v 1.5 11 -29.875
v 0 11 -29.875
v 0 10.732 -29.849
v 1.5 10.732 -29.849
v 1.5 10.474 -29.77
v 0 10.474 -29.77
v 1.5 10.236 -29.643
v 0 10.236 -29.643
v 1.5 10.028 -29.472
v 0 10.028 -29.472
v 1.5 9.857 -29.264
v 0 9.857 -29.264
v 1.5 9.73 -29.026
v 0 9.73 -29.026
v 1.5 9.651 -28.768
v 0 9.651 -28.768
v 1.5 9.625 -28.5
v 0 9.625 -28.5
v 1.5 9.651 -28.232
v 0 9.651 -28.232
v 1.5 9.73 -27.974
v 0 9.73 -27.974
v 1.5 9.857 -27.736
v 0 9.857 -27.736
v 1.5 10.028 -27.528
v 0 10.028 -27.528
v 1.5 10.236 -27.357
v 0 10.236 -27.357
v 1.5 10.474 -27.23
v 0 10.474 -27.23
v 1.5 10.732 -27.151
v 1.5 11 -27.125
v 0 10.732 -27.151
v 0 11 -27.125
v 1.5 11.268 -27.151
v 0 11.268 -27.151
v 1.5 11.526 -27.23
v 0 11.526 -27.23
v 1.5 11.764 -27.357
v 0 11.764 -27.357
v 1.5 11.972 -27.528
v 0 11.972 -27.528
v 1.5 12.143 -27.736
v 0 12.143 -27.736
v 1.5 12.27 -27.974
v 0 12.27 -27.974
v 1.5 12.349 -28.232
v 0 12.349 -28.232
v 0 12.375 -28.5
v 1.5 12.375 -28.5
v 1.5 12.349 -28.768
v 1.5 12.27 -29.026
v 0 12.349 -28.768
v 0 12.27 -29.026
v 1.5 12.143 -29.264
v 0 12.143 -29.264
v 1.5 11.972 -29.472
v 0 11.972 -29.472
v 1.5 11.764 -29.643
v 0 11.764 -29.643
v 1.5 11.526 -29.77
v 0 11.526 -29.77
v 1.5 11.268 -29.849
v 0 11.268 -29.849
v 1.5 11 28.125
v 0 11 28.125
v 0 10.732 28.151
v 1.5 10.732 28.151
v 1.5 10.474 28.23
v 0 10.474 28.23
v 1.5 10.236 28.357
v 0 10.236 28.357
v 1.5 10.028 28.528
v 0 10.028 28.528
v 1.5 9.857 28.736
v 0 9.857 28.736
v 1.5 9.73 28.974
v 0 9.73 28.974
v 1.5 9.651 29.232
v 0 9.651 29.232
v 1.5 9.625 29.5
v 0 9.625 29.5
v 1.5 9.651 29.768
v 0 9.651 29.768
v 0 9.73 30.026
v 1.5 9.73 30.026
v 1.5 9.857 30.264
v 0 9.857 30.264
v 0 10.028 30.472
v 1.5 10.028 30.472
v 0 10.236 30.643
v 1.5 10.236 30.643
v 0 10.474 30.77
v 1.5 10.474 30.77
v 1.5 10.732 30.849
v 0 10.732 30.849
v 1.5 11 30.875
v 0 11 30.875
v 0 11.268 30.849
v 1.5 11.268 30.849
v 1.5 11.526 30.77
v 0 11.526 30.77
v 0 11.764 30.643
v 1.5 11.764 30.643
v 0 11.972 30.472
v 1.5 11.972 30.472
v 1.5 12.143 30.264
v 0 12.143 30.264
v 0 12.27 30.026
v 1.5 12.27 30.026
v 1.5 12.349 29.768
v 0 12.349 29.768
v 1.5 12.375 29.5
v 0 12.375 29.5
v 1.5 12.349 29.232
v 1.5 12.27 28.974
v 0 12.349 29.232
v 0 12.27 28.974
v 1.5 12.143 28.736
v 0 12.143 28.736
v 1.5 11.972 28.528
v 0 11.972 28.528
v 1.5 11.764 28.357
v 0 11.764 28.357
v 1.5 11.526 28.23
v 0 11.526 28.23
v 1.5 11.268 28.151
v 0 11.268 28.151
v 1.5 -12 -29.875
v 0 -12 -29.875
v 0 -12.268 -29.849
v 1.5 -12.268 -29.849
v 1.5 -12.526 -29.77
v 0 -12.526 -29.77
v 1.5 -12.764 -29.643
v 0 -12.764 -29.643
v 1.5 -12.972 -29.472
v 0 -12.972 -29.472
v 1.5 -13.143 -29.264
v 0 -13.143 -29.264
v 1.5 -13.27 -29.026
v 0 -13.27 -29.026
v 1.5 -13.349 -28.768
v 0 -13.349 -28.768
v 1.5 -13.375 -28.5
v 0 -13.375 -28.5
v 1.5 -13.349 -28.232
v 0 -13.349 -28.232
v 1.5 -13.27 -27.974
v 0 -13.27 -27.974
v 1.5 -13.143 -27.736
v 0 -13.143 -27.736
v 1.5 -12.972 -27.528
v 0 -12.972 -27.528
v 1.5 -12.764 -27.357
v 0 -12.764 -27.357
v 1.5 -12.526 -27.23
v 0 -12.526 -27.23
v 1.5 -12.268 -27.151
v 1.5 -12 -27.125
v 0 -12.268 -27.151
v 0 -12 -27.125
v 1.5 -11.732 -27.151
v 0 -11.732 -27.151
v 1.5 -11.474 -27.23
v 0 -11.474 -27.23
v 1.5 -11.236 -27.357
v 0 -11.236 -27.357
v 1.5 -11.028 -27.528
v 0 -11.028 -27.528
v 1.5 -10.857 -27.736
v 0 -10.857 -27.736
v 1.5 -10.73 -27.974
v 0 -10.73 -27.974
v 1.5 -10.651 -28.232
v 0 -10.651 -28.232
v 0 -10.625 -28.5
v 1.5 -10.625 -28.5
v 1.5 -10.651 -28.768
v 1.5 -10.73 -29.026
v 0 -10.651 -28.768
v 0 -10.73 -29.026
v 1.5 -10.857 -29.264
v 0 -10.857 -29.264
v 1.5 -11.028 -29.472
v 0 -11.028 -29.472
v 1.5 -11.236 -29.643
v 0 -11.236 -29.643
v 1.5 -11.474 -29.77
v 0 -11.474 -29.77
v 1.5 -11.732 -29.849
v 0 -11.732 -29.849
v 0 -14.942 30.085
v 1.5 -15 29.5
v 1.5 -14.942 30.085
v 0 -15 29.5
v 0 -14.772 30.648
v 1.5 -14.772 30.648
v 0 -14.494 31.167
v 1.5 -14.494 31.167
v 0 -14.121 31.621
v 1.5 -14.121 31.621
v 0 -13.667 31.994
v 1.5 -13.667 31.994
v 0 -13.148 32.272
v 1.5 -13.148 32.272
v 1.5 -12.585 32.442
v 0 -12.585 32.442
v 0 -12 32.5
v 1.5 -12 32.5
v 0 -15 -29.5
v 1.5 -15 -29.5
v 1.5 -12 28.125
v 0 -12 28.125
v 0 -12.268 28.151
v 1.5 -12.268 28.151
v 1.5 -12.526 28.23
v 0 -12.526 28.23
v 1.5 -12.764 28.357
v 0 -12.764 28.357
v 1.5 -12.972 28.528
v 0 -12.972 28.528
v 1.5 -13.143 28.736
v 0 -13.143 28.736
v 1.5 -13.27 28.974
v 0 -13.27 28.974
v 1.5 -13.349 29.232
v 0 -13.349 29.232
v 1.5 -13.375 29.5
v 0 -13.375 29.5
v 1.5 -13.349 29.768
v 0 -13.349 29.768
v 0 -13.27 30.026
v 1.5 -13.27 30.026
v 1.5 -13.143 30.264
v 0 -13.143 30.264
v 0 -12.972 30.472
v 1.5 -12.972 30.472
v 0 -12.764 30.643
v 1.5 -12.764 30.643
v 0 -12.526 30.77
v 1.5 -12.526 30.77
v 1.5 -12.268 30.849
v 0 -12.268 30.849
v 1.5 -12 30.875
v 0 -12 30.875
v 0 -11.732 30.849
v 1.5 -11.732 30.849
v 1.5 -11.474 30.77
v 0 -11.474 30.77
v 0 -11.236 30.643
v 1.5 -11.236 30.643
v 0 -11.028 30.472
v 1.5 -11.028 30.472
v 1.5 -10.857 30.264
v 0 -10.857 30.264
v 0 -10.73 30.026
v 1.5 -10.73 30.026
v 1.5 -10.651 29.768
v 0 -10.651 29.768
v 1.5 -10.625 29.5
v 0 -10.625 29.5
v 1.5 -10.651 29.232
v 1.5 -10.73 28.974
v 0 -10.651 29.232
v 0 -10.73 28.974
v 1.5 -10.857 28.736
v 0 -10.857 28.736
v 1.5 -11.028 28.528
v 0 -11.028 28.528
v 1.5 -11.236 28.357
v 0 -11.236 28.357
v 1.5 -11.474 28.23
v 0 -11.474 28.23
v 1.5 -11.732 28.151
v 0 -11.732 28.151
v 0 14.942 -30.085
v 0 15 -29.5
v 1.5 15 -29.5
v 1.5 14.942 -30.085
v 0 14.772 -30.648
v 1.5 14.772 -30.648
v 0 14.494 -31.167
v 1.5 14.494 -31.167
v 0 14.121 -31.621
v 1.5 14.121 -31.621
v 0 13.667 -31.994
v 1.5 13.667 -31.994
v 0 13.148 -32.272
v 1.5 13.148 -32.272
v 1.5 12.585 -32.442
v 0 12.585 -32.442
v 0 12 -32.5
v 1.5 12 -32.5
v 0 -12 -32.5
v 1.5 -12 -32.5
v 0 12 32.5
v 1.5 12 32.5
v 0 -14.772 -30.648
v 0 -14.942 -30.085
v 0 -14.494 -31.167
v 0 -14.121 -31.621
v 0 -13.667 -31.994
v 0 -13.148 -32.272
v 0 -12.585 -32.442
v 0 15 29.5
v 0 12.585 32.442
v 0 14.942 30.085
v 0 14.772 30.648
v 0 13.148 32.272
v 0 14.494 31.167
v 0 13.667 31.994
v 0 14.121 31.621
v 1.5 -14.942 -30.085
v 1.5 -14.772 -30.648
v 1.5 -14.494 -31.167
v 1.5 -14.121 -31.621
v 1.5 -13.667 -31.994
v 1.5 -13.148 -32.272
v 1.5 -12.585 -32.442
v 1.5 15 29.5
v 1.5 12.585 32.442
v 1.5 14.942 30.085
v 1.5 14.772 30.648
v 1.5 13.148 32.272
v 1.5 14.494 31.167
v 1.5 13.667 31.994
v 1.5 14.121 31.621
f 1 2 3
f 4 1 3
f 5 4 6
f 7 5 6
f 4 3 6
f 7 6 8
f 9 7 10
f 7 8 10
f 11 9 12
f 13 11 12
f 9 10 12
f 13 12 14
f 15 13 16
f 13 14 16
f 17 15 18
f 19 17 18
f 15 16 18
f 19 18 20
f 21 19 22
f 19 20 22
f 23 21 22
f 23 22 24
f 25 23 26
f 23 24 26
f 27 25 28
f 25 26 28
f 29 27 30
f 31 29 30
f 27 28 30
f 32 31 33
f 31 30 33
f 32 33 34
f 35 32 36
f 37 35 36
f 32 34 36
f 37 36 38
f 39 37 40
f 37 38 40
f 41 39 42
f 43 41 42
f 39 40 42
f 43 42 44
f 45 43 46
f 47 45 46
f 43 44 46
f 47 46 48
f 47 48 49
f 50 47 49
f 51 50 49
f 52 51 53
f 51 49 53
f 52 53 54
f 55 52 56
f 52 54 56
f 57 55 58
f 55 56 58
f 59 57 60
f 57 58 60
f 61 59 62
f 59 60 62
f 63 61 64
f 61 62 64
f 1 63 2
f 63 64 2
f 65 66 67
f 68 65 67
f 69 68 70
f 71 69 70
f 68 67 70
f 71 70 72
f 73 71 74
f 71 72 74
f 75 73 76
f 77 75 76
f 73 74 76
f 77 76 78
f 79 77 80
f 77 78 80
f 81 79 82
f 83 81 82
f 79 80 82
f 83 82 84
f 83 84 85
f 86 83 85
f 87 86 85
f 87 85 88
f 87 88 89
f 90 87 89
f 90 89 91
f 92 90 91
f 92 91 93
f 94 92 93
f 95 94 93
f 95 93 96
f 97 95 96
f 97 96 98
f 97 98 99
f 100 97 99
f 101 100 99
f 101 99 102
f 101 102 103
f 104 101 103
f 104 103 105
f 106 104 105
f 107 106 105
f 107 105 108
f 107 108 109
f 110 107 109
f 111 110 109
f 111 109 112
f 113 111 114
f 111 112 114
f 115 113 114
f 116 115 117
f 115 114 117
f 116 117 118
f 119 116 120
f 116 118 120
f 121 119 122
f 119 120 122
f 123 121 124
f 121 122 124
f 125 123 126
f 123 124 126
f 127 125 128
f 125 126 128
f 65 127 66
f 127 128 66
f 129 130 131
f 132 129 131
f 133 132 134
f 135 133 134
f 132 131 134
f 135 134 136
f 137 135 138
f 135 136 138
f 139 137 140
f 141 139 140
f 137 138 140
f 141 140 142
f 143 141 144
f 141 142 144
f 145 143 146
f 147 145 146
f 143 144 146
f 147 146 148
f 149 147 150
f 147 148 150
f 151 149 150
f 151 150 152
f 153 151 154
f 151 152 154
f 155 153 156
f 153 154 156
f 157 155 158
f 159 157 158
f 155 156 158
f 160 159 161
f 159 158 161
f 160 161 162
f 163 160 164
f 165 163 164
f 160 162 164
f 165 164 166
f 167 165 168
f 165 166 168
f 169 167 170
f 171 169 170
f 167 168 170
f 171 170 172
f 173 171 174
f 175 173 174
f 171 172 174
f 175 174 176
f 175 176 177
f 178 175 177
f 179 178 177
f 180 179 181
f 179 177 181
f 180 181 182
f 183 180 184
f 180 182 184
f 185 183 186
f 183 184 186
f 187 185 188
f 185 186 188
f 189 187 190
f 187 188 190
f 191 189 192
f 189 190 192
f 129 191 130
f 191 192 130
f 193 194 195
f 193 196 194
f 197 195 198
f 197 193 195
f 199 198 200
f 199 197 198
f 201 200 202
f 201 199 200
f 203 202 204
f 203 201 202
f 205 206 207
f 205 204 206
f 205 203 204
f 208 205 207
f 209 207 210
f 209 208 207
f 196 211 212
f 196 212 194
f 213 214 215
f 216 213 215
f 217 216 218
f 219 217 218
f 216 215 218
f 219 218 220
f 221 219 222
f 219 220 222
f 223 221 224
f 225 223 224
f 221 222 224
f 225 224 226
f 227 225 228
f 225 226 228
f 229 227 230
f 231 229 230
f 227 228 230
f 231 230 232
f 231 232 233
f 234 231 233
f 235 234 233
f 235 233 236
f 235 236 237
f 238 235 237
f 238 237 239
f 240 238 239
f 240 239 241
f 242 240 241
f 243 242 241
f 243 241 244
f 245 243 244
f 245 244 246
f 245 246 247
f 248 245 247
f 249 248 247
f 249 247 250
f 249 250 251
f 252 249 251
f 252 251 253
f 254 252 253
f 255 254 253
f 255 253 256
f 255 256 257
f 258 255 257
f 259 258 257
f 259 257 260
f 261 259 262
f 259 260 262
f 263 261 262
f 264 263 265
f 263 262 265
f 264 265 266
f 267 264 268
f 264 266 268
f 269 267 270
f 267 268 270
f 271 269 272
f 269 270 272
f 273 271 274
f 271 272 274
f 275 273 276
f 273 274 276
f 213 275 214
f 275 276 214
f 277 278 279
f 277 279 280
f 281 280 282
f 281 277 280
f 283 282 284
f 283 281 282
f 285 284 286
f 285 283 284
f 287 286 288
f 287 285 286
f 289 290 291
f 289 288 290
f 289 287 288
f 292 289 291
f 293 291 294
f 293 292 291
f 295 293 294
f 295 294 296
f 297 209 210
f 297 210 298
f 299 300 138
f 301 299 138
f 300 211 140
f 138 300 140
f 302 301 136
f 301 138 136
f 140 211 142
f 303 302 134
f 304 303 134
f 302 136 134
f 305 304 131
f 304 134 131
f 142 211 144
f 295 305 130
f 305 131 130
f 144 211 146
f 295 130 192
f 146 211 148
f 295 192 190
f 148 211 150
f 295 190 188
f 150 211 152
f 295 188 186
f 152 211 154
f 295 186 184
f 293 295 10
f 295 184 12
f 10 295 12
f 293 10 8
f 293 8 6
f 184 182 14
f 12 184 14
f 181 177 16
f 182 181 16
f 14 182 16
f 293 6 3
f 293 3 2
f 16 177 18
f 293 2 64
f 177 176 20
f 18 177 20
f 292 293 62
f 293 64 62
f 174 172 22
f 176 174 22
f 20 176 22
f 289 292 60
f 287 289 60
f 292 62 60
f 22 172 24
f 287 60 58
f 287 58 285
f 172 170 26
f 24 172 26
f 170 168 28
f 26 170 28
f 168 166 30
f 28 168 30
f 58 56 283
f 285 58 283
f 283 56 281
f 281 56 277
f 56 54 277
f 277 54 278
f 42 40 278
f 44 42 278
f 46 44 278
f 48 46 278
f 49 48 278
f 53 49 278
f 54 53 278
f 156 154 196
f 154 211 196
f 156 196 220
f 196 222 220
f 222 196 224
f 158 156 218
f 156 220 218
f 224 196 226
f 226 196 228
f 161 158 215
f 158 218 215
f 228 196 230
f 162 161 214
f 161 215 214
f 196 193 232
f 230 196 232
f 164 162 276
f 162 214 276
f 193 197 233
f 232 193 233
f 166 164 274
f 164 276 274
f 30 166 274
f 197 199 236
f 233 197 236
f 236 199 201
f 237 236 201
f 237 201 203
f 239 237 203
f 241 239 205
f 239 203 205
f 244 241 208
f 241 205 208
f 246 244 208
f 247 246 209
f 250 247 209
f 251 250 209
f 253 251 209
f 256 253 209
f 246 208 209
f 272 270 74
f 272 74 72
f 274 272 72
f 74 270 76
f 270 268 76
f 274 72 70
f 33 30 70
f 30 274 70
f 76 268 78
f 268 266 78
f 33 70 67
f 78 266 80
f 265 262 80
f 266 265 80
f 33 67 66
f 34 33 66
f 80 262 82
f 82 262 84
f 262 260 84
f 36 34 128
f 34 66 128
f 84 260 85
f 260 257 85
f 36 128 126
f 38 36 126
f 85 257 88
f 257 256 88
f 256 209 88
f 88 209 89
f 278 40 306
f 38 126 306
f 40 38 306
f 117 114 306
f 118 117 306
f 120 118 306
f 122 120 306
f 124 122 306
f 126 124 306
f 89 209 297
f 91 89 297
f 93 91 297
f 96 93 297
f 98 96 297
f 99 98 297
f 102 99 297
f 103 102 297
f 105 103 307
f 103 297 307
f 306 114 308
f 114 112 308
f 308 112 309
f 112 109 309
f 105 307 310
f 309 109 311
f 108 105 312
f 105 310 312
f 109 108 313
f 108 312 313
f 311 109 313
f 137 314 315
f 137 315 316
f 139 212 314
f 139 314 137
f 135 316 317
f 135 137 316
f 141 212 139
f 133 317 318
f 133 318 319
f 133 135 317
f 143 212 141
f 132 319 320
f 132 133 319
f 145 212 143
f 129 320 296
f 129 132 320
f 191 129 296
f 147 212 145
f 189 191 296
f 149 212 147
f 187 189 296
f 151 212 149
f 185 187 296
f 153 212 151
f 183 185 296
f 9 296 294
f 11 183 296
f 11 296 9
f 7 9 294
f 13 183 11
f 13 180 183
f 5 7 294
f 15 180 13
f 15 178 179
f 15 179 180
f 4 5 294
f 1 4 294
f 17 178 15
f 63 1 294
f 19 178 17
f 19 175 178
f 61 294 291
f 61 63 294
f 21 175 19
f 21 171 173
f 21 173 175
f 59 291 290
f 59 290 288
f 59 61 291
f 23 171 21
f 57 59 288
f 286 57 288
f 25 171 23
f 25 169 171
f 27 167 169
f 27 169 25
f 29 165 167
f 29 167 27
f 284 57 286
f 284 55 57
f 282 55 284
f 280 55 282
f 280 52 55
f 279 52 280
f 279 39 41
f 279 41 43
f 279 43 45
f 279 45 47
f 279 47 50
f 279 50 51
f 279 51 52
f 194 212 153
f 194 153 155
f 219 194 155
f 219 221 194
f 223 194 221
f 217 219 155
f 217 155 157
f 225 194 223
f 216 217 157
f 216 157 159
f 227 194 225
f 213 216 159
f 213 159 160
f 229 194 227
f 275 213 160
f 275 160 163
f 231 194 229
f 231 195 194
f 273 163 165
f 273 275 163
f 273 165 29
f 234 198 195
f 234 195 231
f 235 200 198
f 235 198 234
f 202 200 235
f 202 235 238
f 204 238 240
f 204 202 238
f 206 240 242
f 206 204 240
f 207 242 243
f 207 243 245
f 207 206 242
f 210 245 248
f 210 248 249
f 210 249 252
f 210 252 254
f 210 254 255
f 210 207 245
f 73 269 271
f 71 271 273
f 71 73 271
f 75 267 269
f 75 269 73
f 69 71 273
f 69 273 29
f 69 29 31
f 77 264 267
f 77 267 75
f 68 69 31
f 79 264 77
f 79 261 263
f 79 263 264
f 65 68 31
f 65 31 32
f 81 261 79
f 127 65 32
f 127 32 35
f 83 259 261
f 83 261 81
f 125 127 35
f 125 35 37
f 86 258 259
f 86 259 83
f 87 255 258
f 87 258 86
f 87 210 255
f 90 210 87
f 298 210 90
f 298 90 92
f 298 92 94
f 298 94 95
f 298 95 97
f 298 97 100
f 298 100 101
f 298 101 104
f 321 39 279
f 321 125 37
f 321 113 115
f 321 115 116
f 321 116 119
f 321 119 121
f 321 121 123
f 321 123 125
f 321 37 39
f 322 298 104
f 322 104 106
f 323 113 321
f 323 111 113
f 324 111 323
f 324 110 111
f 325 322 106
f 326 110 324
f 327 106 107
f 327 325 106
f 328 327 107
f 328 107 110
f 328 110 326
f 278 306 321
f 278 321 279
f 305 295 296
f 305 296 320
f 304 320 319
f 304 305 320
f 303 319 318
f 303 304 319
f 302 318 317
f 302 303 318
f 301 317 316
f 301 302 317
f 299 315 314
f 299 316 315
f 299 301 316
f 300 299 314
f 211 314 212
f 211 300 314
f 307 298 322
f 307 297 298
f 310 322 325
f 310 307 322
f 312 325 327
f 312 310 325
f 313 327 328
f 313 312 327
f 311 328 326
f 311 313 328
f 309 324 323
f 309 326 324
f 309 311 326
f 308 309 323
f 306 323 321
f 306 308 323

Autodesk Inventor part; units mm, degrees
ref_plane "YZ Plane" through (0, 0, 0) normal (1, 0, 0) x (0, 1, 0)
ref_plane "XZ Plane" through (0, 0, 0) normal (0, 1, 0) x (-1, 0, 0)
ref_plane "XY Plane" through (0, 0, 0) normal (0, 0, 1) x (1, 0, 0)
sketch "Sketch1" plane through (0, 0, 0) normal (1, 0, 0) x (0, 1, 0)
  line L0 (-12, 32.5) -> (12, 32.5)
  line L1 (15, 29.5) -> (15, -29.5)
  line L2 (12, -32.5) -> (-12, -32.5)
  line L3 (-15, -29.5) -> (-15, 29.5)
  line L4 (-15, 32.5) -> (15, -32.5) construction
  line L5 (15, 32.5) -> (-15, -32.5) construction
  arc A0 (-12, 32.5) -> (-15, 29.5) centre (-12, 29.5) ccw
  arc A1 (15, 29.5) -> (12, 32.5) centre (12, 29.5) ccw
  arc A2 (12, -32.5) -> (15, -29.5) centre (12, -29.5) ccw
  arc A3 (-15, -29.5) -> (-12, -32.5) centre (-12, -29.5) ccw
  point P0 (0, 0)
  dimension "d0" = 30
  dimension "d1" = 65
  dimension "d22" = 3
extrude "Extrusion1" add sketch "Sketch1" along normal blind 1.5
fillet "Fillet1" [suppressed]
sketch "Sketch2" plane through (1.5, 0, 0) normal (1, 0, 0) x (0, 0, -1)
  line L0 (29.5, 15) -> (-29.5, 15) projected
  line L1 (-32.5, 12) -> (-32.5, -12) projected
  arc A0 (-32.5, -12) -> (-29.5, -15) centre (-29.5, -12) ccw projected
  point P0 (0, 0)
  point P1 (-29.5, 11)
  point P2 (32, 15)
  point P3 (-32, 15)
  point P4 (-33, 14)
  point P5 (-33, -14)
  point P6 (28.5, 11)
  point P7 (28.5, -12)
  dimension "d5" = 4
  dimension "d6" = 3
  dimension "d9" = 58
  dimension "d12" = 23
hole "Hole1" at (1.5, 11, 29.5) at (1.5, 11, -28.5) at (1.5, -12, 29.5) at (1.5, -12, -28.5) direction (-1, 0, 0) diameter 2.75 end through all
properties part number "RPI_Zero"
